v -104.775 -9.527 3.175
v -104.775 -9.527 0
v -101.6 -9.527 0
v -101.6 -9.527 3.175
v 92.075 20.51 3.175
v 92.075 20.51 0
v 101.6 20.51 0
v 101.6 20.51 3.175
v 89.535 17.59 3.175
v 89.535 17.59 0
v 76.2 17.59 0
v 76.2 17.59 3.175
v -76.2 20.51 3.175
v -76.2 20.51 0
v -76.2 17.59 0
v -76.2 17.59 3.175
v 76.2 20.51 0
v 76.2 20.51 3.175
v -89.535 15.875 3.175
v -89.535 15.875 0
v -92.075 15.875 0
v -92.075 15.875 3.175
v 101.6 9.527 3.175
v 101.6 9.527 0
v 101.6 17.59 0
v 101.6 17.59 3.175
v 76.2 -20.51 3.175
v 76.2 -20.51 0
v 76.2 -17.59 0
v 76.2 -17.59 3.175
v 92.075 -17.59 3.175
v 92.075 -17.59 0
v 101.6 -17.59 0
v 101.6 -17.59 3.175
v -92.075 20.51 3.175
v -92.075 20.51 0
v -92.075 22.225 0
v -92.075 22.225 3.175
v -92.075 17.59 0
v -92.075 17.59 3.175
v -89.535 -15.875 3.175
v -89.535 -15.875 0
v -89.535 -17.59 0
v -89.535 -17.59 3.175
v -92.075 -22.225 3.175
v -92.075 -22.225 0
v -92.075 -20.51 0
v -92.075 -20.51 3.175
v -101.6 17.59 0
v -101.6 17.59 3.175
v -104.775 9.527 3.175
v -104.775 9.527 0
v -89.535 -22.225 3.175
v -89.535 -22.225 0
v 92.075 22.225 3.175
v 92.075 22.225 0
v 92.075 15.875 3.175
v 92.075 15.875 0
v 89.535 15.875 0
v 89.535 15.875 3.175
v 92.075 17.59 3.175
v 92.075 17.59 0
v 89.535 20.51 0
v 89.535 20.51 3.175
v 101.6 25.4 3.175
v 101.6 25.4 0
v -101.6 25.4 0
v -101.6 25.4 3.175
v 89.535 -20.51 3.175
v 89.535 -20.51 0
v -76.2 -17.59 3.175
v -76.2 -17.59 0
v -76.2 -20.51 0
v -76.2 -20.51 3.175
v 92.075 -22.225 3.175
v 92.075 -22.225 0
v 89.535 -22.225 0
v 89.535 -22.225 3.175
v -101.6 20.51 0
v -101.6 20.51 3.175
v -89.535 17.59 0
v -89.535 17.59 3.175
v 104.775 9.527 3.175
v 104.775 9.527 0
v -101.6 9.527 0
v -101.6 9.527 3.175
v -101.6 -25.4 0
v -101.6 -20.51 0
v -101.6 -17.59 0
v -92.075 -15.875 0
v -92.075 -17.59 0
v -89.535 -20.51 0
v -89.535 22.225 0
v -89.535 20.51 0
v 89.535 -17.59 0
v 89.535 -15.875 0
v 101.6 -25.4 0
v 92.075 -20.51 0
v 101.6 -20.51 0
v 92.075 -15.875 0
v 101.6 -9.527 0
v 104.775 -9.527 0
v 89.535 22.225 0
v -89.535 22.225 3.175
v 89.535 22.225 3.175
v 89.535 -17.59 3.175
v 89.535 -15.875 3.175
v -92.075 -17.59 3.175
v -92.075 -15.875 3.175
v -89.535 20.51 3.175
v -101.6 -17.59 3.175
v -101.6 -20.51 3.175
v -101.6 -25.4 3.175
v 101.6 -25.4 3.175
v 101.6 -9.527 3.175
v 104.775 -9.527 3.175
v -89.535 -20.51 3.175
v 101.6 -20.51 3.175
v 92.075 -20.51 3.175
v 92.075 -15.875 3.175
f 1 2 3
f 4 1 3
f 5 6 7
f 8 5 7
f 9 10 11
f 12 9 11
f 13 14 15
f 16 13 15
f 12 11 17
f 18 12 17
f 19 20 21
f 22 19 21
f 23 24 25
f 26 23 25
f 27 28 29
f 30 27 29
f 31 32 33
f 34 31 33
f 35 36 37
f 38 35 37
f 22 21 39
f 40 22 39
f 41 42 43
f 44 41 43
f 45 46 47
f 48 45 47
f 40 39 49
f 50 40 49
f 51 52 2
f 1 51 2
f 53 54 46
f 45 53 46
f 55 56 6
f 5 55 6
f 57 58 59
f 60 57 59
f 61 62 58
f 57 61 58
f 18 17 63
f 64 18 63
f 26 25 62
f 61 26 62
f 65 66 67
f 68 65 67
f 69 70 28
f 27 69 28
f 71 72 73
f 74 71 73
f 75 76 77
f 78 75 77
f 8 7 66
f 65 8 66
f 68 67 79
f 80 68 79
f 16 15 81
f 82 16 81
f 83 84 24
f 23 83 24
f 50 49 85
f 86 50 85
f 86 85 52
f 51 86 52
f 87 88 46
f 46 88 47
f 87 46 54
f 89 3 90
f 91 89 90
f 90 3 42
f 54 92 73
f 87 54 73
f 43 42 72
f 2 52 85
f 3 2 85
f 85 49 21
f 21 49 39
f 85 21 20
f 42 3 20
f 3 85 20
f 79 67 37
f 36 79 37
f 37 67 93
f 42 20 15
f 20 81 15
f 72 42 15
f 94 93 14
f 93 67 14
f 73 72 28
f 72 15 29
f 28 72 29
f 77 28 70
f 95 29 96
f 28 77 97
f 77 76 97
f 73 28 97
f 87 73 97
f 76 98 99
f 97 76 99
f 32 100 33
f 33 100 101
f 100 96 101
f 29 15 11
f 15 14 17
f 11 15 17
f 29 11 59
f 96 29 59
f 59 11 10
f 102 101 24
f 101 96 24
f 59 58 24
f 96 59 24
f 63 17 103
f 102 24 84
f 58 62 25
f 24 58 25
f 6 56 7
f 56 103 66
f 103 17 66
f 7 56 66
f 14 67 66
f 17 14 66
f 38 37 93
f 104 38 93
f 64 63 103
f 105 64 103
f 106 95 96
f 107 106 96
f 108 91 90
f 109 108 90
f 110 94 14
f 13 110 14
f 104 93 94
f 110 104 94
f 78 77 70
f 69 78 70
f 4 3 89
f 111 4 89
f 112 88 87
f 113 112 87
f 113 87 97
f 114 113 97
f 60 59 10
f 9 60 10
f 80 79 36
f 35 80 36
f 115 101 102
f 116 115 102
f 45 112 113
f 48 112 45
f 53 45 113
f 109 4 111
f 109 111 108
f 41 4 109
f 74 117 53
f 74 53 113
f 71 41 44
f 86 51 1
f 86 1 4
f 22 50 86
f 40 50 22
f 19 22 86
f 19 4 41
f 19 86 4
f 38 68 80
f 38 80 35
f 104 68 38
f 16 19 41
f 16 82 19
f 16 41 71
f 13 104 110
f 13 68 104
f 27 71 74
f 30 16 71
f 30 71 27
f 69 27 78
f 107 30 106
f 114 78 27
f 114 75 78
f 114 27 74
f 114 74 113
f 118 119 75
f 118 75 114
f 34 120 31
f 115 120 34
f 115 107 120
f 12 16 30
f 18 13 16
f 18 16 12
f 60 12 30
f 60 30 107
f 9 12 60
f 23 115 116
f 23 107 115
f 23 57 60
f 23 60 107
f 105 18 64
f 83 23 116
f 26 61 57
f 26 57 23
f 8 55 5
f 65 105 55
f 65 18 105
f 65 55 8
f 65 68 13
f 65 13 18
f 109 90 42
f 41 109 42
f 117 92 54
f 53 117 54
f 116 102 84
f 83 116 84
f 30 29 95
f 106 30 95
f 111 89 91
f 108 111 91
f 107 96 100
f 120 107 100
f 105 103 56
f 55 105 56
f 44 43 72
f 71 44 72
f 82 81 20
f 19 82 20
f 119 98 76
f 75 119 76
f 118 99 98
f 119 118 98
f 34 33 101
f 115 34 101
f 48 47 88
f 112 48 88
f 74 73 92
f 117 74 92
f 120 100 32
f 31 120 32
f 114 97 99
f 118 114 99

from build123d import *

# Parameters (mm, degrees)
F1_DEPTH = 3.175


with BuildPart() as f1:
    # F0 (on Top) → F1 (new body)
    with BuildSketch(Plane.XY):
        Polygon((101.6, 25.4), (0, 25.4), (-101.6, 25.4), (-101.6, 20.5105), (-92.075, 20.5105), (-92.075, 22.225), (-89.535, 22.225), (-89.535, 20.5105), (-76.2, 20.5105), (-76.2, 17.5895), (-89.535, 17.5895), (-89.535, 15.875), (-92.075, 15.875), (-92.075, 17.5895), (-101.6, 17.5895), (-101.6, 9.526501), (-104.775, 9.526501), (-104.775, 0), (-104.775, -9.526501), (-101.6, -9.526501), (-101.6, -17.5895), (-92.075, -17.5895), (-92.075, -15.875), (-89.535, -15.875), (-89.535, -17.5895), (-76.2, -17.5895), (-76.2, -20.5105), (-89.535, -20.5105), (-89.535, -22.225), (-92.075, -22.225), (-92.075, -20.5105), (-101.6, -20.5105), (-101.6, -25.4), (0, -25.4), (101.6, -25.4), (101.6, -20.5105), (92.075, -20.5105), (92.075, -22.225), (89.535, -22.225), (89.535, -20.5105), (76.2, -20.5105), (76.2, -17.5895), (89.535, -17.5895), (89.535, -15.875), (92.075, -15.875), (92.075, -17.5895), (101.6, -17.5895), (101.6, -9.526501), (104.775, -9.526501), (104.775, 0), (104.775, 9.526501), (101.6, 9.526501), (101.6, 17.5895), (92.075, 17.5895), (92.075, 15.875), (89.535, 15.875), (89.535, 17.5895), (76.2, 17.5895), (76.2, 20.5105), (89.535, 20.5105), (89.535, 22.225), (92.075, 22.225), (92.075, 20.5105), (101.6, 20.5105), align=None)
    extrude(amount=F1_DEPTH)


solid = f1.part
